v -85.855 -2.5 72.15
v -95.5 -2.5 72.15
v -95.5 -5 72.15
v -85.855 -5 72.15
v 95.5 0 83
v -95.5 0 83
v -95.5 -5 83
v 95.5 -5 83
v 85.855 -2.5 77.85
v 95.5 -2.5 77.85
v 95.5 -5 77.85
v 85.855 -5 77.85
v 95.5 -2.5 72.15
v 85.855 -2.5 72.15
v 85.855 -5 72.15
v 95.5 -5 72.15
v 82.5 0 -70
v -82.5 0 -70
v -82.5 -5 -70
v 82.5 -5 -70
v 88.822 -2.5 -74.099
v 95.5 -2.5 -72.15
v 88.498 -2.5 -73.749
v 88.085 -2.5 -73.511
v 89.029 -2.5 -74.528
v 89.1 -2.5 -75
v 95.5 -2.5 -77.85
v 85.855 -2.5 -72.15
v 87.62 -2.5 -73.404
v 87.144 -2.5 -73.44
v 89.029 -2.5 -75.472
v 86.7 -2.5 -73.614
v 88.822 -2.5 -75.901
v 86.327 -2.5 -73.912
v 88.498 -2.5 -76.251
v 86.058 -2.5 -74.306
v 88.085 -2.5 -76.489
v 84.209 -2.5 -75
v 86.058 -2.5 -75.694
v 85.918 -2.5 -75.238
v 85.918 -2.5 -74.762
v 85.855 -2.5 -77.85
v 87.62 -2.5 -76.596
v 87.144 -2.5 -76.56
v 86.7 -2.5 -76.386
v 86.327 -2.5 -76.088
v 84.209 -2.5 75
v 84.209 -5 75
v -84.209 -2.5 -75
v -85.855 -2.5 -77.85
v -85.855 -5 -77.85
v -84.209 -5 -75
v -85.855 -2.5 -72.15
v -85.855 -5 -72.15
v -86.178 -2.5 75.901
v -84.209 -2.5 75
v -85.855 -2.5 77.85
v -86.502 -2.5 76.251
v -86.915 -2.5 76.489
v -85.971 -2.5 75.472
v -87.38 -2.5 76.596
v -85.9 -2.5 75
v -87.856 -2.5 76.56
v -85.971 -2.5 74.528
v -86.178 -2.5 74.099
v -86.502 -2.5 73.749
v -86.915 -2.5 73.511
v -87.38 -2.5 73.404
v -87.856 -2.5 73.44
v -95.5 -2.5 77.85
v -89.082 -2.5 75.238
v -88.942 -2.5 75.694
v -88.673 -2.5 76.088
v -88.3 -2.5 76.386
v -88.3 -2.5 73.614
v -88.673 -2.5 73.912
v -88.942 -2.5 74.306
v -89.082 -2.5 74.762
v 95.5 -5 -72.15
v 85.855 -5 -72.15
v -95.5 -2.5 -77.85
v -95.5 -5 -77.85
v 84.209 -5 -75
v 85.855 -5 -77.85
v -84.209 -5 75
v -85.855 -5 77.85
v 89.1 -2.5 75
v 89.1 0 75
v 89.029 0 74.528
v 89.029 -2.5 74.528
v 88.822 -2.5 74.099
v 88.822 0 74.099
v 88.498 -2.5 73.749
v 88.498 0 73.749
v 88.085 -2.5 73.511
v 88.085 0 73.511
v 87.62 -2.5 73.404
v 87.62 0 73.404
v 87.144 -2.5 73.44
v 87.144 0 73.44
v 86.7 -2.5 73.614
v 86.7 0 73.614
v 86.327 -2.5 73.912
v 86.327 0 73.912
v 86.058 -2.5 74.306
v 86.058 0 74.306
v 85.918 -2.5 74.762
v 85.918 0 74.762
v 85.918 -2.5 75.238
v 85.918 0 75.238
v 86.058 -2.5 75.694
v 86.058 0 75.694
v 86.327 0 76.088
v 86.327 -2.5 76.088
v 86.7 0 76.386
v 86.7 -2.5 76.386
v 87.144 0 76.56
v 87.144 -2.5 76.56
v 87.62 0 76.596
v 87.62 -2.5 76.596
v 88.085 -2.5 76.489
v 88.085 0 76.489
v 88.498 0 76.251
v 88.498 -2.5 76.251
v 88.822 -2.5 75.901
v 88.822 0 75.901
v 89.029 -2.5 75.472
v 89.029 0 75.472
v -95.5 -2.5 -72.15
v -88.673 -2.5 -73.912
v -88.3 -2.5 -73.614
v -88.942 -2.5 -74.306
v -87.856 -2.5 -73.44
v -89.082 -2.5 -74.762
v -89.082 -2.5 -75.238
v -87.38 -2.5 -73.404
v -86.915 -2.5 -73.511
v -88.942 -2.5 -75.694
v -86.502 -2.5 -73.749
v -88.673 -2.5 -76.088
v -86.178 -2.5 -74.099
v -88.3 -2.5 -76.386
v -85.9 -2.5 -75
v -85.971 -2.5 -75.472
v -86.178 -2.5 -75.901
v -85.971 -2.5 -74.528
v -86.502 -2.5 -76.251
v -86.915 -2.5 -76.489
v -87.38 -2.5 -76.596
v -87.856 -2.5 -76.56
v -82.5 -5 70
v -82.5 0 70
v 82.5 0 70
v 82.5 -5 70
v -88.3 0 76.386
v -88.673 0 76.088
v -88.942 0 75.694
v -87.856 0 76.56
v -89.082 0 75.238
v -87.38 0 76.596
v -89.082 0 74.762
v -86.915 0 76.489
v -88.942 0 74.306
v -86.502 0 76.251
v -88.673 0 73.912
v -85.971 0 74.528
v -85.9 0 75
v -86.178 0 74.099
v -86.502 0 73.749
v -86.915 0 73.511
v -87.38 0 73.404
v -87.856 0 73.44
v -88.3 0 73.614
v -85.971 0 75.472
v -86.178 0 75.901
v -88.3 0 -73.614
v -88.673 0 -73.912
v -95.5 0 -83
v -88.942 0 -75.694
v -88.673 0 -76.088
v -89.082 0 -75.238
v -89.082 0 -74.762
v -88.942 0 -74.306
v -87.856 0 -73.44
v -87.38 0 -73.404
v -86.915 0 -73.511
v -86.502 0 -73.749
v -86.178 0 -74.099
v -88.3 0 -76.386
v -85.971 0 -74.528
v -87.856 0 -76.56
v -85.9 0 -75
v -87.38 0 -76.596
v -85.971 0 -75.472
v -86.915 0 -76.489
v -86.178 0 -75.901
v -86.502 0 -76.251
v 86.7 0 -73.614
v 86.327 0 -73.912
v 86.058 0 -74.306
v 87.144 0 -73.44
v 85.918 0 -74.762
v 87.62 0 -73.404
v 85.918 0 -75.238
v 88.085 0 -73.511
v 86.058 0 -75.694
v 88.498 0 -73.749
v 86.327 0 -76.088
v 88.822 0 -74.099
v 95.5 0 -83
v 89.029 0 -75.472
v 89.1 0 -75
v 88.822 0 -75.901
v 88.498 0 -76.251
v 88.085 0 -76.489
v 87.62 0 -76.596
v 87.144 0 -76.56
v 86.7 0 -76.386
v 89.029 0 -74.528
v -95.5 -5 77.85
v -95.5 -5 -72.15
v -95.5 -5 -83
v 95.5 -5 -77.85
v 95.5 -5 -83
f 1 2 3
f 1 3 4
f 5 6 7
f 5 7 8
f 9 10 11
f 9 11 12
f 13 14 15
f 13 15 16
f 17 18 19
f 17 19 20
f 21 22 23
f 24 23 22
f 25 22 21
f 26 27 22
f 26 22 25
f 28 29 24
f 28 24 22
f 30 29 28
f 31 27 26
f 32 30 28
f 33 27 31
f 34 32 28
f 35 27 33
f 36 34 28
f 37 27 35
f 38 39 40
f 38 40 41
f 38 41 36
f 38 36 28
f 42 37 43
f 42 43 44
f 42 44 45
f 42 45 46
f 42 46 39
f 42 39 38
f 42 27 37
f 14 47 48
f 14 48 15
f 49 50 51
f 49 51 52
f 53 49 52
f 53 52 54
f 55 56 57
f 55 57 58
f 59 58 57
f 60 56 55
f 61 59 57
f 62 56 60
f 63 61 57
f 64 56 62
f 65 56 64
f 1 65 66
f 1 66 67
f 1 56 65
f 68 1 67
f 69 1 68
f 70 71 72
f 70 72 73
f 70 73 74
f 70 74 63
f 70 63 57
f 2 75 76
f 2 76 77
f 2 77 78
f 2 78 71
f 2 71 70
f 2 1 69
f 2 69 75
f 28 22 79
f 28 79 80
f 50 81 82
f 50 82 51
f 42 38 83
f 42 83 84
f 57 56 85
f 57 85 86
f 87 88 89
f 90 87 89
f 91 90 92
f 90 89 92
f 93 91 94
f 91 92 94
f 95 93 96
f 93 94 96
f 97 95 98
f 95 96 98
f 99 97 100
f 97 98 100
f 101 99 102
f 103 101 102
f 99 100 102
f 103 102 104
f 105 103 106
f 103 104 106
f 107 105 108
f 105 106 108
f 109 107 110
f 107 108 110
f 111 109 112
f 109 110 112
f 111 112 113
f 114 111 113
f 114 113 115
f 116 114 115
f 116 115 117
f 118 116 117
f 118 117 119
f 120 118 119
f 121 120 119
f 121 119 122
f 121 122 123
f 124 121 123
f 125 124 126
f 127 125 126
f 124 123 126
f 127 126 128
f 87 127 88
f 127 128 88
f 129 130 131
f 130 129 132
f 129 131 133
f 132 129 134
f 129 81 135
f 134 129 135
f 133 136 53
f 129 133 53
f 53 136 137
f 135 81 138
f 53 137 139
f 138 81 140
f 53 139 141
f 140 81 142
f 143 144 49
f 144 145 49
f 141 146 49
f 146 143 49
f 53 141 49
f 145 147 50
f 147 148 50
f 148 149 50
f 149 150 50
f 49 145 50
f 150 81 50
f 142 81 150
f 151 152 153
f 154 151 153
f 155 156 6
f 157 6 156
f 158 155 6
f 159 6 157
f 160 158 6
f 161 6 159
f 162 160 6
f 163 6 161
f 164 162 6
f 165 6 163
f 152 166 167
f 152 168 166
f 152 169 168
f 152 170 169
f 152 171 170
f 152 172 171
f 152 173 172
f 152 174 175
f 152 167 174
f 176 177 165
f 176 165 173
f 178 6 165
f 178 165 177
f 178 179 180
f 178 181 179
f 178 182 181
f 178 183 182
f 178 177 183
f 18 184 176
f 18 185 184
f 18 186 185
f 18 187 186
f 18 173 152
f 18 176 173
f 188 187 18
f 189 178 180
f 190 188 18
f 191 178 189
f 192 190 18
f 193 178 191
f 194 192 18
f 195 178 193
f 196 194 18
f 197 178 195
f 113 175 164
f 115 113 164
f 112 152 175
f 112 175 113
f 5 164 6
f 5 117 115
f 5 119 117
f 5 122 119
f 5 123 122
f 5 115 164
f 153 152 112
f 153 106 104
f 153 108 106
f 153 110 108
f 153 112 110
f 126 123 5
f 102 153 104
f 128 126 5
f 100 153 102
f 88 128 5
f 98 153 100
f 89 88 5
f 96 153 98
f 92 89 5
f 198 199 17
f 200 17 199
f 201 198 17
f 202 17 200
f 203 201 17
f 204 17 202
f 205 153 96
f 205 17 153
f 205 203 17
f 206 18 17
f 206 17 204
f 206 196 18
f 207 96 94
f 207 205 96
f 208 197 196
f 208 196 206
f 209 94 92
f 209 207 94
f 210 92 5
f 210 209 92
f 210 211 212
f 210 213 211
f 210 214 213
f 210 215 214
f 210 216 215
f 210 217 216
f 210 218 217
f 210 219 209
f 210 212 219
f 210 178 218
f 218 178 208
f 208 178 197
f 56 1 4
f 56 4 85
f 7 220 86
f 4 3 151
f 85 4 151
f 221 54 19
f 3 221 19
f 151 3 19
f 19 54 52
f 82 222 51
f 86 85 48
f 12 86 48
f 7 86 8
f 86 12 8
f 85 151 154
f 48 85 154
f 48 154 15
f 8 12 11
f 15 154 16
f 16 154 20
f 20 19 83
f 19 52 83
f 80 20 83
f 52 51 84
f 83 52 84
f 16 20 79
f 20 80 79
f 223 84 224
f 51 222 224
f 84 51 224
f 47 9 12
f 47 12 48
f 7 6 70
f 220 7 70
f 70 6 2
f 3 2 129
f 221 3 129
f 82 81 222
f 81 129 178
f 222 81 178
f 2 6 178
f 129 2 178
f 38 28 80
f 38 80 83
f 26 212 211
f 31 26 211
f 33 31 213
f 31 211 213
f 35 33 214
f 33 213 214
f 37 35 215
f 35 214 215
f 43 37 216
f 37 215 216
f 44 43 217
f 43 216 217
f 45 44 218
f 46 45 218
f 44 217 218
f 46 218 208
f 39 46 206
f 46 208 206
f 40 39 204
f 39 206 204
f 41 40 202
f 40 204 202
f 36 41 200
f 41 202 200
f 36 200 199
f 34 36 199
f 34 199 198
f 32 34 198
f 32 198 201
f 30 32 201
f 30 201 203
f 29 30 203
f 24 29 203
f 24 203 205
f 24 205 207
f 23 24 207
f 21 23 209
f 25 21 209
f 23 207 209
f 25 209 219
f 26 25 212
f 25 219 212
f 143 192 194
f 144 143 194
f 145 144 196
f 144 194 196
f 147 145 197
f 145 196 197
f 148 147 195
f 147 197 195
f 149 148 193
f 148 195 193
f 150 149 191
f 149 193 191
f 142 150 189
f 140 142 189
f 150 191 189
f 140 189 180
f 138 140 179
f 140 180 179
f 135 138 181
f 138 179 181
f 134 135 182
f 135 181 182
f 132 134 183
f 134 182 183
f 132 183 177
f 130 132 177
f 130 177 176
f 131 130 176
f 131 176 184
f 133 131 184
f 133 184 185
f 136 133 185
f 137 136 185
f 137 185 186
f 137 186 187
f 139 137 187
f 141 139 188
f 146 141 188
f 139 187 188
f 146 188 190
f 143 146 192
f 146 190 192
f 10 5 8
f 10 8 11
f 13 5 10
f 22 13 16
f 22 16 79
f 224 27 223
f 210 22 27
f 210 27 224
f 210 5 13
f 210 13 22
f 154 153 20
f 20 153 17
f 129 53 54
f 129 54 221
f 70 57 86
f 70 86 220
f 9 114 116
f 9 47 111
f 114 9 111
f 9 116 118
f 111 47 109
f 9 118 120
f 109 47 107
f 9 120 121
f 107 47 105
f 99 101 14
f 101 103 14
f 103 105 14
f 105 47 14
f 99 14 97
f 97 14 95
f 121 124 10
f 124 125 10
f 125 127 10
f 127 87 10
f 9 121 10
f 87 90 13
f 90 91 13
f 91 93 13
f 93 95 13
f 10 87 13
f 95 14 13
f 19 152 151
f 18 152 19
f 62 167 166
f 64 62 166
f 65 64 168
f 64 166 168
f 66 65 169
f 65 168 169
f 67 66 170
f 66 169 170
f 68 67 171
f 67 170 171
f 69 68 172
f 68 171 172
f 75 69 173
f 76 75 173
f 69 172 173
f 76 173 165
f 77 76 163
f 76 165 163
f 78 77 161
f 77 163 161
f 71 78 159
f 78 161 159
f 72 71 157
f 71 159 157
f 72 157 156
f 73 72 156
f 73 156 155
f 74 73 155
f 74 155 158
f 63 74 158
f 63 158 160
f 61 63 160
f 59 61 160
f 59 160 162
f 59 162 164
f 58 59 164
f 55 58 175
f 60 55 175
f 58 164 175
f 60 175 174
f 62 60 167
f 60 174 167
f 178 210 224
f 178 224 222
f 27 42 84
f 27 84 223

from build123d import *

# Parameters (mm, degrees)
SKETCH2_W           = 165
SKETCH2_H           = 140
BOSS_EXTRUDE1_DEPTH = 5
SKETCH2_3_R         = 1.6
BOSS_EXTRUDE2_DEPTH = 2.5


with BuildPart() as part:
    # Sketch2 → Boss-Extrude1 (new body)
    with BuildSketch(Plane(origin=(0, 0, 0), x_dir=(1, 0, 0), z_dir=(0, 1, 0))):
        Polygon((-95.5, -77.85), (-95.5, -83), (95.5, -83), (95.5, -77.85), (85.854551733, -77.85), (84.209103466, -75), (85.854551733, -72.15), (95.5, -72.15), (95.5, 72.15), (85.854551733, 72.15), (84.209103466, 75), (85.854551733, 77.85), (95.5, 77.85), (95.5, 83), (-95.5, 83), (-95.5, 77.85), (-85.854551733, 77.85), (-84.209103466, 75), (-85.854551733, 72.15), (-95.5, 72.15), (-95.5, -72.15), (-85.854551733, -72.15), (-84.209103466, -75), (-85.854551733, -77.85), align=None)
        Rectangle(SKETCH2_W, SKETCH2_H, mode=Mode.SUBTRACT)
    extrude(amount=-BOSS_EXTRUDE1_DEPTH)

    # Sketch2<3> → Boss-Extrude2 (add)
    # profile 1 of 4: a face of its own
    with BuildSketch(Plane(origin=(0, 0, 0), x_dir=(1, 0, 0), z_dir=(0, 1, 0))):
        Polygon((-95.5, -77.85), (-85.854551733, -77.85), (-84.209103466, -75), (-85.854551733, -72.15), (-95.5, -72.15), align=None)
        with Locations((-87.5, -75)):
            Circle(SKETCH2_3_R, mode=Mode.SUBTRACT)
    # profile 2 of 4: a face of its own
    with BuildSketch(Plane(origin=(0, 0, 0), x_dir=(1, 0, 0), z_dir=(0, 1, 0))):
        Polygon((95.5, -77.85), (95.5, -72.15), (85.854551733, -72.15), (84.209103466, -75), (85.854551733, -77.85), align=None)
        with Locations((87.5, -75)):
            Circle(SKETCH2_3_R, mode=Mode.SUBTRACT)
    # profile 3 of 4: a face of its own
    with BuildSketch(Plane(origin=(0, 0, 0), x_dir=(1, 0, 0), z_dir=(0, 1, 0))):
        Polygon((-95.5, 72.15), (-85.854551733, 72.15), (-84.209103466, 75), (-85.854551733, 77.85), (-95.5, 77.85), align=None)
        with Locations((-87.5, 75)):
            Circle(SKETCH2_3_R, mode=Mode.SUBTRACT)
    # profile 4 of 4: a face of its own
    with BuildSketch(Plane(origin=(0, 0, 0), x_dir=(1, 0, 0), z_dir=(0, 1, 0))):
        Polygon((95.5, 72.15), (95.5, 77.85), (85.854551733, 77.85), (84.209103466, 75), (85.854551733, 72.15), align=None)
        with Locations((87.5, 75)):
            Circle(SKETCH2_3_R, mode=Mode.SUBTRACT)
    extrude(amount=-BOSS_EXTRUDE2_DEPTH)


solid = part.part
